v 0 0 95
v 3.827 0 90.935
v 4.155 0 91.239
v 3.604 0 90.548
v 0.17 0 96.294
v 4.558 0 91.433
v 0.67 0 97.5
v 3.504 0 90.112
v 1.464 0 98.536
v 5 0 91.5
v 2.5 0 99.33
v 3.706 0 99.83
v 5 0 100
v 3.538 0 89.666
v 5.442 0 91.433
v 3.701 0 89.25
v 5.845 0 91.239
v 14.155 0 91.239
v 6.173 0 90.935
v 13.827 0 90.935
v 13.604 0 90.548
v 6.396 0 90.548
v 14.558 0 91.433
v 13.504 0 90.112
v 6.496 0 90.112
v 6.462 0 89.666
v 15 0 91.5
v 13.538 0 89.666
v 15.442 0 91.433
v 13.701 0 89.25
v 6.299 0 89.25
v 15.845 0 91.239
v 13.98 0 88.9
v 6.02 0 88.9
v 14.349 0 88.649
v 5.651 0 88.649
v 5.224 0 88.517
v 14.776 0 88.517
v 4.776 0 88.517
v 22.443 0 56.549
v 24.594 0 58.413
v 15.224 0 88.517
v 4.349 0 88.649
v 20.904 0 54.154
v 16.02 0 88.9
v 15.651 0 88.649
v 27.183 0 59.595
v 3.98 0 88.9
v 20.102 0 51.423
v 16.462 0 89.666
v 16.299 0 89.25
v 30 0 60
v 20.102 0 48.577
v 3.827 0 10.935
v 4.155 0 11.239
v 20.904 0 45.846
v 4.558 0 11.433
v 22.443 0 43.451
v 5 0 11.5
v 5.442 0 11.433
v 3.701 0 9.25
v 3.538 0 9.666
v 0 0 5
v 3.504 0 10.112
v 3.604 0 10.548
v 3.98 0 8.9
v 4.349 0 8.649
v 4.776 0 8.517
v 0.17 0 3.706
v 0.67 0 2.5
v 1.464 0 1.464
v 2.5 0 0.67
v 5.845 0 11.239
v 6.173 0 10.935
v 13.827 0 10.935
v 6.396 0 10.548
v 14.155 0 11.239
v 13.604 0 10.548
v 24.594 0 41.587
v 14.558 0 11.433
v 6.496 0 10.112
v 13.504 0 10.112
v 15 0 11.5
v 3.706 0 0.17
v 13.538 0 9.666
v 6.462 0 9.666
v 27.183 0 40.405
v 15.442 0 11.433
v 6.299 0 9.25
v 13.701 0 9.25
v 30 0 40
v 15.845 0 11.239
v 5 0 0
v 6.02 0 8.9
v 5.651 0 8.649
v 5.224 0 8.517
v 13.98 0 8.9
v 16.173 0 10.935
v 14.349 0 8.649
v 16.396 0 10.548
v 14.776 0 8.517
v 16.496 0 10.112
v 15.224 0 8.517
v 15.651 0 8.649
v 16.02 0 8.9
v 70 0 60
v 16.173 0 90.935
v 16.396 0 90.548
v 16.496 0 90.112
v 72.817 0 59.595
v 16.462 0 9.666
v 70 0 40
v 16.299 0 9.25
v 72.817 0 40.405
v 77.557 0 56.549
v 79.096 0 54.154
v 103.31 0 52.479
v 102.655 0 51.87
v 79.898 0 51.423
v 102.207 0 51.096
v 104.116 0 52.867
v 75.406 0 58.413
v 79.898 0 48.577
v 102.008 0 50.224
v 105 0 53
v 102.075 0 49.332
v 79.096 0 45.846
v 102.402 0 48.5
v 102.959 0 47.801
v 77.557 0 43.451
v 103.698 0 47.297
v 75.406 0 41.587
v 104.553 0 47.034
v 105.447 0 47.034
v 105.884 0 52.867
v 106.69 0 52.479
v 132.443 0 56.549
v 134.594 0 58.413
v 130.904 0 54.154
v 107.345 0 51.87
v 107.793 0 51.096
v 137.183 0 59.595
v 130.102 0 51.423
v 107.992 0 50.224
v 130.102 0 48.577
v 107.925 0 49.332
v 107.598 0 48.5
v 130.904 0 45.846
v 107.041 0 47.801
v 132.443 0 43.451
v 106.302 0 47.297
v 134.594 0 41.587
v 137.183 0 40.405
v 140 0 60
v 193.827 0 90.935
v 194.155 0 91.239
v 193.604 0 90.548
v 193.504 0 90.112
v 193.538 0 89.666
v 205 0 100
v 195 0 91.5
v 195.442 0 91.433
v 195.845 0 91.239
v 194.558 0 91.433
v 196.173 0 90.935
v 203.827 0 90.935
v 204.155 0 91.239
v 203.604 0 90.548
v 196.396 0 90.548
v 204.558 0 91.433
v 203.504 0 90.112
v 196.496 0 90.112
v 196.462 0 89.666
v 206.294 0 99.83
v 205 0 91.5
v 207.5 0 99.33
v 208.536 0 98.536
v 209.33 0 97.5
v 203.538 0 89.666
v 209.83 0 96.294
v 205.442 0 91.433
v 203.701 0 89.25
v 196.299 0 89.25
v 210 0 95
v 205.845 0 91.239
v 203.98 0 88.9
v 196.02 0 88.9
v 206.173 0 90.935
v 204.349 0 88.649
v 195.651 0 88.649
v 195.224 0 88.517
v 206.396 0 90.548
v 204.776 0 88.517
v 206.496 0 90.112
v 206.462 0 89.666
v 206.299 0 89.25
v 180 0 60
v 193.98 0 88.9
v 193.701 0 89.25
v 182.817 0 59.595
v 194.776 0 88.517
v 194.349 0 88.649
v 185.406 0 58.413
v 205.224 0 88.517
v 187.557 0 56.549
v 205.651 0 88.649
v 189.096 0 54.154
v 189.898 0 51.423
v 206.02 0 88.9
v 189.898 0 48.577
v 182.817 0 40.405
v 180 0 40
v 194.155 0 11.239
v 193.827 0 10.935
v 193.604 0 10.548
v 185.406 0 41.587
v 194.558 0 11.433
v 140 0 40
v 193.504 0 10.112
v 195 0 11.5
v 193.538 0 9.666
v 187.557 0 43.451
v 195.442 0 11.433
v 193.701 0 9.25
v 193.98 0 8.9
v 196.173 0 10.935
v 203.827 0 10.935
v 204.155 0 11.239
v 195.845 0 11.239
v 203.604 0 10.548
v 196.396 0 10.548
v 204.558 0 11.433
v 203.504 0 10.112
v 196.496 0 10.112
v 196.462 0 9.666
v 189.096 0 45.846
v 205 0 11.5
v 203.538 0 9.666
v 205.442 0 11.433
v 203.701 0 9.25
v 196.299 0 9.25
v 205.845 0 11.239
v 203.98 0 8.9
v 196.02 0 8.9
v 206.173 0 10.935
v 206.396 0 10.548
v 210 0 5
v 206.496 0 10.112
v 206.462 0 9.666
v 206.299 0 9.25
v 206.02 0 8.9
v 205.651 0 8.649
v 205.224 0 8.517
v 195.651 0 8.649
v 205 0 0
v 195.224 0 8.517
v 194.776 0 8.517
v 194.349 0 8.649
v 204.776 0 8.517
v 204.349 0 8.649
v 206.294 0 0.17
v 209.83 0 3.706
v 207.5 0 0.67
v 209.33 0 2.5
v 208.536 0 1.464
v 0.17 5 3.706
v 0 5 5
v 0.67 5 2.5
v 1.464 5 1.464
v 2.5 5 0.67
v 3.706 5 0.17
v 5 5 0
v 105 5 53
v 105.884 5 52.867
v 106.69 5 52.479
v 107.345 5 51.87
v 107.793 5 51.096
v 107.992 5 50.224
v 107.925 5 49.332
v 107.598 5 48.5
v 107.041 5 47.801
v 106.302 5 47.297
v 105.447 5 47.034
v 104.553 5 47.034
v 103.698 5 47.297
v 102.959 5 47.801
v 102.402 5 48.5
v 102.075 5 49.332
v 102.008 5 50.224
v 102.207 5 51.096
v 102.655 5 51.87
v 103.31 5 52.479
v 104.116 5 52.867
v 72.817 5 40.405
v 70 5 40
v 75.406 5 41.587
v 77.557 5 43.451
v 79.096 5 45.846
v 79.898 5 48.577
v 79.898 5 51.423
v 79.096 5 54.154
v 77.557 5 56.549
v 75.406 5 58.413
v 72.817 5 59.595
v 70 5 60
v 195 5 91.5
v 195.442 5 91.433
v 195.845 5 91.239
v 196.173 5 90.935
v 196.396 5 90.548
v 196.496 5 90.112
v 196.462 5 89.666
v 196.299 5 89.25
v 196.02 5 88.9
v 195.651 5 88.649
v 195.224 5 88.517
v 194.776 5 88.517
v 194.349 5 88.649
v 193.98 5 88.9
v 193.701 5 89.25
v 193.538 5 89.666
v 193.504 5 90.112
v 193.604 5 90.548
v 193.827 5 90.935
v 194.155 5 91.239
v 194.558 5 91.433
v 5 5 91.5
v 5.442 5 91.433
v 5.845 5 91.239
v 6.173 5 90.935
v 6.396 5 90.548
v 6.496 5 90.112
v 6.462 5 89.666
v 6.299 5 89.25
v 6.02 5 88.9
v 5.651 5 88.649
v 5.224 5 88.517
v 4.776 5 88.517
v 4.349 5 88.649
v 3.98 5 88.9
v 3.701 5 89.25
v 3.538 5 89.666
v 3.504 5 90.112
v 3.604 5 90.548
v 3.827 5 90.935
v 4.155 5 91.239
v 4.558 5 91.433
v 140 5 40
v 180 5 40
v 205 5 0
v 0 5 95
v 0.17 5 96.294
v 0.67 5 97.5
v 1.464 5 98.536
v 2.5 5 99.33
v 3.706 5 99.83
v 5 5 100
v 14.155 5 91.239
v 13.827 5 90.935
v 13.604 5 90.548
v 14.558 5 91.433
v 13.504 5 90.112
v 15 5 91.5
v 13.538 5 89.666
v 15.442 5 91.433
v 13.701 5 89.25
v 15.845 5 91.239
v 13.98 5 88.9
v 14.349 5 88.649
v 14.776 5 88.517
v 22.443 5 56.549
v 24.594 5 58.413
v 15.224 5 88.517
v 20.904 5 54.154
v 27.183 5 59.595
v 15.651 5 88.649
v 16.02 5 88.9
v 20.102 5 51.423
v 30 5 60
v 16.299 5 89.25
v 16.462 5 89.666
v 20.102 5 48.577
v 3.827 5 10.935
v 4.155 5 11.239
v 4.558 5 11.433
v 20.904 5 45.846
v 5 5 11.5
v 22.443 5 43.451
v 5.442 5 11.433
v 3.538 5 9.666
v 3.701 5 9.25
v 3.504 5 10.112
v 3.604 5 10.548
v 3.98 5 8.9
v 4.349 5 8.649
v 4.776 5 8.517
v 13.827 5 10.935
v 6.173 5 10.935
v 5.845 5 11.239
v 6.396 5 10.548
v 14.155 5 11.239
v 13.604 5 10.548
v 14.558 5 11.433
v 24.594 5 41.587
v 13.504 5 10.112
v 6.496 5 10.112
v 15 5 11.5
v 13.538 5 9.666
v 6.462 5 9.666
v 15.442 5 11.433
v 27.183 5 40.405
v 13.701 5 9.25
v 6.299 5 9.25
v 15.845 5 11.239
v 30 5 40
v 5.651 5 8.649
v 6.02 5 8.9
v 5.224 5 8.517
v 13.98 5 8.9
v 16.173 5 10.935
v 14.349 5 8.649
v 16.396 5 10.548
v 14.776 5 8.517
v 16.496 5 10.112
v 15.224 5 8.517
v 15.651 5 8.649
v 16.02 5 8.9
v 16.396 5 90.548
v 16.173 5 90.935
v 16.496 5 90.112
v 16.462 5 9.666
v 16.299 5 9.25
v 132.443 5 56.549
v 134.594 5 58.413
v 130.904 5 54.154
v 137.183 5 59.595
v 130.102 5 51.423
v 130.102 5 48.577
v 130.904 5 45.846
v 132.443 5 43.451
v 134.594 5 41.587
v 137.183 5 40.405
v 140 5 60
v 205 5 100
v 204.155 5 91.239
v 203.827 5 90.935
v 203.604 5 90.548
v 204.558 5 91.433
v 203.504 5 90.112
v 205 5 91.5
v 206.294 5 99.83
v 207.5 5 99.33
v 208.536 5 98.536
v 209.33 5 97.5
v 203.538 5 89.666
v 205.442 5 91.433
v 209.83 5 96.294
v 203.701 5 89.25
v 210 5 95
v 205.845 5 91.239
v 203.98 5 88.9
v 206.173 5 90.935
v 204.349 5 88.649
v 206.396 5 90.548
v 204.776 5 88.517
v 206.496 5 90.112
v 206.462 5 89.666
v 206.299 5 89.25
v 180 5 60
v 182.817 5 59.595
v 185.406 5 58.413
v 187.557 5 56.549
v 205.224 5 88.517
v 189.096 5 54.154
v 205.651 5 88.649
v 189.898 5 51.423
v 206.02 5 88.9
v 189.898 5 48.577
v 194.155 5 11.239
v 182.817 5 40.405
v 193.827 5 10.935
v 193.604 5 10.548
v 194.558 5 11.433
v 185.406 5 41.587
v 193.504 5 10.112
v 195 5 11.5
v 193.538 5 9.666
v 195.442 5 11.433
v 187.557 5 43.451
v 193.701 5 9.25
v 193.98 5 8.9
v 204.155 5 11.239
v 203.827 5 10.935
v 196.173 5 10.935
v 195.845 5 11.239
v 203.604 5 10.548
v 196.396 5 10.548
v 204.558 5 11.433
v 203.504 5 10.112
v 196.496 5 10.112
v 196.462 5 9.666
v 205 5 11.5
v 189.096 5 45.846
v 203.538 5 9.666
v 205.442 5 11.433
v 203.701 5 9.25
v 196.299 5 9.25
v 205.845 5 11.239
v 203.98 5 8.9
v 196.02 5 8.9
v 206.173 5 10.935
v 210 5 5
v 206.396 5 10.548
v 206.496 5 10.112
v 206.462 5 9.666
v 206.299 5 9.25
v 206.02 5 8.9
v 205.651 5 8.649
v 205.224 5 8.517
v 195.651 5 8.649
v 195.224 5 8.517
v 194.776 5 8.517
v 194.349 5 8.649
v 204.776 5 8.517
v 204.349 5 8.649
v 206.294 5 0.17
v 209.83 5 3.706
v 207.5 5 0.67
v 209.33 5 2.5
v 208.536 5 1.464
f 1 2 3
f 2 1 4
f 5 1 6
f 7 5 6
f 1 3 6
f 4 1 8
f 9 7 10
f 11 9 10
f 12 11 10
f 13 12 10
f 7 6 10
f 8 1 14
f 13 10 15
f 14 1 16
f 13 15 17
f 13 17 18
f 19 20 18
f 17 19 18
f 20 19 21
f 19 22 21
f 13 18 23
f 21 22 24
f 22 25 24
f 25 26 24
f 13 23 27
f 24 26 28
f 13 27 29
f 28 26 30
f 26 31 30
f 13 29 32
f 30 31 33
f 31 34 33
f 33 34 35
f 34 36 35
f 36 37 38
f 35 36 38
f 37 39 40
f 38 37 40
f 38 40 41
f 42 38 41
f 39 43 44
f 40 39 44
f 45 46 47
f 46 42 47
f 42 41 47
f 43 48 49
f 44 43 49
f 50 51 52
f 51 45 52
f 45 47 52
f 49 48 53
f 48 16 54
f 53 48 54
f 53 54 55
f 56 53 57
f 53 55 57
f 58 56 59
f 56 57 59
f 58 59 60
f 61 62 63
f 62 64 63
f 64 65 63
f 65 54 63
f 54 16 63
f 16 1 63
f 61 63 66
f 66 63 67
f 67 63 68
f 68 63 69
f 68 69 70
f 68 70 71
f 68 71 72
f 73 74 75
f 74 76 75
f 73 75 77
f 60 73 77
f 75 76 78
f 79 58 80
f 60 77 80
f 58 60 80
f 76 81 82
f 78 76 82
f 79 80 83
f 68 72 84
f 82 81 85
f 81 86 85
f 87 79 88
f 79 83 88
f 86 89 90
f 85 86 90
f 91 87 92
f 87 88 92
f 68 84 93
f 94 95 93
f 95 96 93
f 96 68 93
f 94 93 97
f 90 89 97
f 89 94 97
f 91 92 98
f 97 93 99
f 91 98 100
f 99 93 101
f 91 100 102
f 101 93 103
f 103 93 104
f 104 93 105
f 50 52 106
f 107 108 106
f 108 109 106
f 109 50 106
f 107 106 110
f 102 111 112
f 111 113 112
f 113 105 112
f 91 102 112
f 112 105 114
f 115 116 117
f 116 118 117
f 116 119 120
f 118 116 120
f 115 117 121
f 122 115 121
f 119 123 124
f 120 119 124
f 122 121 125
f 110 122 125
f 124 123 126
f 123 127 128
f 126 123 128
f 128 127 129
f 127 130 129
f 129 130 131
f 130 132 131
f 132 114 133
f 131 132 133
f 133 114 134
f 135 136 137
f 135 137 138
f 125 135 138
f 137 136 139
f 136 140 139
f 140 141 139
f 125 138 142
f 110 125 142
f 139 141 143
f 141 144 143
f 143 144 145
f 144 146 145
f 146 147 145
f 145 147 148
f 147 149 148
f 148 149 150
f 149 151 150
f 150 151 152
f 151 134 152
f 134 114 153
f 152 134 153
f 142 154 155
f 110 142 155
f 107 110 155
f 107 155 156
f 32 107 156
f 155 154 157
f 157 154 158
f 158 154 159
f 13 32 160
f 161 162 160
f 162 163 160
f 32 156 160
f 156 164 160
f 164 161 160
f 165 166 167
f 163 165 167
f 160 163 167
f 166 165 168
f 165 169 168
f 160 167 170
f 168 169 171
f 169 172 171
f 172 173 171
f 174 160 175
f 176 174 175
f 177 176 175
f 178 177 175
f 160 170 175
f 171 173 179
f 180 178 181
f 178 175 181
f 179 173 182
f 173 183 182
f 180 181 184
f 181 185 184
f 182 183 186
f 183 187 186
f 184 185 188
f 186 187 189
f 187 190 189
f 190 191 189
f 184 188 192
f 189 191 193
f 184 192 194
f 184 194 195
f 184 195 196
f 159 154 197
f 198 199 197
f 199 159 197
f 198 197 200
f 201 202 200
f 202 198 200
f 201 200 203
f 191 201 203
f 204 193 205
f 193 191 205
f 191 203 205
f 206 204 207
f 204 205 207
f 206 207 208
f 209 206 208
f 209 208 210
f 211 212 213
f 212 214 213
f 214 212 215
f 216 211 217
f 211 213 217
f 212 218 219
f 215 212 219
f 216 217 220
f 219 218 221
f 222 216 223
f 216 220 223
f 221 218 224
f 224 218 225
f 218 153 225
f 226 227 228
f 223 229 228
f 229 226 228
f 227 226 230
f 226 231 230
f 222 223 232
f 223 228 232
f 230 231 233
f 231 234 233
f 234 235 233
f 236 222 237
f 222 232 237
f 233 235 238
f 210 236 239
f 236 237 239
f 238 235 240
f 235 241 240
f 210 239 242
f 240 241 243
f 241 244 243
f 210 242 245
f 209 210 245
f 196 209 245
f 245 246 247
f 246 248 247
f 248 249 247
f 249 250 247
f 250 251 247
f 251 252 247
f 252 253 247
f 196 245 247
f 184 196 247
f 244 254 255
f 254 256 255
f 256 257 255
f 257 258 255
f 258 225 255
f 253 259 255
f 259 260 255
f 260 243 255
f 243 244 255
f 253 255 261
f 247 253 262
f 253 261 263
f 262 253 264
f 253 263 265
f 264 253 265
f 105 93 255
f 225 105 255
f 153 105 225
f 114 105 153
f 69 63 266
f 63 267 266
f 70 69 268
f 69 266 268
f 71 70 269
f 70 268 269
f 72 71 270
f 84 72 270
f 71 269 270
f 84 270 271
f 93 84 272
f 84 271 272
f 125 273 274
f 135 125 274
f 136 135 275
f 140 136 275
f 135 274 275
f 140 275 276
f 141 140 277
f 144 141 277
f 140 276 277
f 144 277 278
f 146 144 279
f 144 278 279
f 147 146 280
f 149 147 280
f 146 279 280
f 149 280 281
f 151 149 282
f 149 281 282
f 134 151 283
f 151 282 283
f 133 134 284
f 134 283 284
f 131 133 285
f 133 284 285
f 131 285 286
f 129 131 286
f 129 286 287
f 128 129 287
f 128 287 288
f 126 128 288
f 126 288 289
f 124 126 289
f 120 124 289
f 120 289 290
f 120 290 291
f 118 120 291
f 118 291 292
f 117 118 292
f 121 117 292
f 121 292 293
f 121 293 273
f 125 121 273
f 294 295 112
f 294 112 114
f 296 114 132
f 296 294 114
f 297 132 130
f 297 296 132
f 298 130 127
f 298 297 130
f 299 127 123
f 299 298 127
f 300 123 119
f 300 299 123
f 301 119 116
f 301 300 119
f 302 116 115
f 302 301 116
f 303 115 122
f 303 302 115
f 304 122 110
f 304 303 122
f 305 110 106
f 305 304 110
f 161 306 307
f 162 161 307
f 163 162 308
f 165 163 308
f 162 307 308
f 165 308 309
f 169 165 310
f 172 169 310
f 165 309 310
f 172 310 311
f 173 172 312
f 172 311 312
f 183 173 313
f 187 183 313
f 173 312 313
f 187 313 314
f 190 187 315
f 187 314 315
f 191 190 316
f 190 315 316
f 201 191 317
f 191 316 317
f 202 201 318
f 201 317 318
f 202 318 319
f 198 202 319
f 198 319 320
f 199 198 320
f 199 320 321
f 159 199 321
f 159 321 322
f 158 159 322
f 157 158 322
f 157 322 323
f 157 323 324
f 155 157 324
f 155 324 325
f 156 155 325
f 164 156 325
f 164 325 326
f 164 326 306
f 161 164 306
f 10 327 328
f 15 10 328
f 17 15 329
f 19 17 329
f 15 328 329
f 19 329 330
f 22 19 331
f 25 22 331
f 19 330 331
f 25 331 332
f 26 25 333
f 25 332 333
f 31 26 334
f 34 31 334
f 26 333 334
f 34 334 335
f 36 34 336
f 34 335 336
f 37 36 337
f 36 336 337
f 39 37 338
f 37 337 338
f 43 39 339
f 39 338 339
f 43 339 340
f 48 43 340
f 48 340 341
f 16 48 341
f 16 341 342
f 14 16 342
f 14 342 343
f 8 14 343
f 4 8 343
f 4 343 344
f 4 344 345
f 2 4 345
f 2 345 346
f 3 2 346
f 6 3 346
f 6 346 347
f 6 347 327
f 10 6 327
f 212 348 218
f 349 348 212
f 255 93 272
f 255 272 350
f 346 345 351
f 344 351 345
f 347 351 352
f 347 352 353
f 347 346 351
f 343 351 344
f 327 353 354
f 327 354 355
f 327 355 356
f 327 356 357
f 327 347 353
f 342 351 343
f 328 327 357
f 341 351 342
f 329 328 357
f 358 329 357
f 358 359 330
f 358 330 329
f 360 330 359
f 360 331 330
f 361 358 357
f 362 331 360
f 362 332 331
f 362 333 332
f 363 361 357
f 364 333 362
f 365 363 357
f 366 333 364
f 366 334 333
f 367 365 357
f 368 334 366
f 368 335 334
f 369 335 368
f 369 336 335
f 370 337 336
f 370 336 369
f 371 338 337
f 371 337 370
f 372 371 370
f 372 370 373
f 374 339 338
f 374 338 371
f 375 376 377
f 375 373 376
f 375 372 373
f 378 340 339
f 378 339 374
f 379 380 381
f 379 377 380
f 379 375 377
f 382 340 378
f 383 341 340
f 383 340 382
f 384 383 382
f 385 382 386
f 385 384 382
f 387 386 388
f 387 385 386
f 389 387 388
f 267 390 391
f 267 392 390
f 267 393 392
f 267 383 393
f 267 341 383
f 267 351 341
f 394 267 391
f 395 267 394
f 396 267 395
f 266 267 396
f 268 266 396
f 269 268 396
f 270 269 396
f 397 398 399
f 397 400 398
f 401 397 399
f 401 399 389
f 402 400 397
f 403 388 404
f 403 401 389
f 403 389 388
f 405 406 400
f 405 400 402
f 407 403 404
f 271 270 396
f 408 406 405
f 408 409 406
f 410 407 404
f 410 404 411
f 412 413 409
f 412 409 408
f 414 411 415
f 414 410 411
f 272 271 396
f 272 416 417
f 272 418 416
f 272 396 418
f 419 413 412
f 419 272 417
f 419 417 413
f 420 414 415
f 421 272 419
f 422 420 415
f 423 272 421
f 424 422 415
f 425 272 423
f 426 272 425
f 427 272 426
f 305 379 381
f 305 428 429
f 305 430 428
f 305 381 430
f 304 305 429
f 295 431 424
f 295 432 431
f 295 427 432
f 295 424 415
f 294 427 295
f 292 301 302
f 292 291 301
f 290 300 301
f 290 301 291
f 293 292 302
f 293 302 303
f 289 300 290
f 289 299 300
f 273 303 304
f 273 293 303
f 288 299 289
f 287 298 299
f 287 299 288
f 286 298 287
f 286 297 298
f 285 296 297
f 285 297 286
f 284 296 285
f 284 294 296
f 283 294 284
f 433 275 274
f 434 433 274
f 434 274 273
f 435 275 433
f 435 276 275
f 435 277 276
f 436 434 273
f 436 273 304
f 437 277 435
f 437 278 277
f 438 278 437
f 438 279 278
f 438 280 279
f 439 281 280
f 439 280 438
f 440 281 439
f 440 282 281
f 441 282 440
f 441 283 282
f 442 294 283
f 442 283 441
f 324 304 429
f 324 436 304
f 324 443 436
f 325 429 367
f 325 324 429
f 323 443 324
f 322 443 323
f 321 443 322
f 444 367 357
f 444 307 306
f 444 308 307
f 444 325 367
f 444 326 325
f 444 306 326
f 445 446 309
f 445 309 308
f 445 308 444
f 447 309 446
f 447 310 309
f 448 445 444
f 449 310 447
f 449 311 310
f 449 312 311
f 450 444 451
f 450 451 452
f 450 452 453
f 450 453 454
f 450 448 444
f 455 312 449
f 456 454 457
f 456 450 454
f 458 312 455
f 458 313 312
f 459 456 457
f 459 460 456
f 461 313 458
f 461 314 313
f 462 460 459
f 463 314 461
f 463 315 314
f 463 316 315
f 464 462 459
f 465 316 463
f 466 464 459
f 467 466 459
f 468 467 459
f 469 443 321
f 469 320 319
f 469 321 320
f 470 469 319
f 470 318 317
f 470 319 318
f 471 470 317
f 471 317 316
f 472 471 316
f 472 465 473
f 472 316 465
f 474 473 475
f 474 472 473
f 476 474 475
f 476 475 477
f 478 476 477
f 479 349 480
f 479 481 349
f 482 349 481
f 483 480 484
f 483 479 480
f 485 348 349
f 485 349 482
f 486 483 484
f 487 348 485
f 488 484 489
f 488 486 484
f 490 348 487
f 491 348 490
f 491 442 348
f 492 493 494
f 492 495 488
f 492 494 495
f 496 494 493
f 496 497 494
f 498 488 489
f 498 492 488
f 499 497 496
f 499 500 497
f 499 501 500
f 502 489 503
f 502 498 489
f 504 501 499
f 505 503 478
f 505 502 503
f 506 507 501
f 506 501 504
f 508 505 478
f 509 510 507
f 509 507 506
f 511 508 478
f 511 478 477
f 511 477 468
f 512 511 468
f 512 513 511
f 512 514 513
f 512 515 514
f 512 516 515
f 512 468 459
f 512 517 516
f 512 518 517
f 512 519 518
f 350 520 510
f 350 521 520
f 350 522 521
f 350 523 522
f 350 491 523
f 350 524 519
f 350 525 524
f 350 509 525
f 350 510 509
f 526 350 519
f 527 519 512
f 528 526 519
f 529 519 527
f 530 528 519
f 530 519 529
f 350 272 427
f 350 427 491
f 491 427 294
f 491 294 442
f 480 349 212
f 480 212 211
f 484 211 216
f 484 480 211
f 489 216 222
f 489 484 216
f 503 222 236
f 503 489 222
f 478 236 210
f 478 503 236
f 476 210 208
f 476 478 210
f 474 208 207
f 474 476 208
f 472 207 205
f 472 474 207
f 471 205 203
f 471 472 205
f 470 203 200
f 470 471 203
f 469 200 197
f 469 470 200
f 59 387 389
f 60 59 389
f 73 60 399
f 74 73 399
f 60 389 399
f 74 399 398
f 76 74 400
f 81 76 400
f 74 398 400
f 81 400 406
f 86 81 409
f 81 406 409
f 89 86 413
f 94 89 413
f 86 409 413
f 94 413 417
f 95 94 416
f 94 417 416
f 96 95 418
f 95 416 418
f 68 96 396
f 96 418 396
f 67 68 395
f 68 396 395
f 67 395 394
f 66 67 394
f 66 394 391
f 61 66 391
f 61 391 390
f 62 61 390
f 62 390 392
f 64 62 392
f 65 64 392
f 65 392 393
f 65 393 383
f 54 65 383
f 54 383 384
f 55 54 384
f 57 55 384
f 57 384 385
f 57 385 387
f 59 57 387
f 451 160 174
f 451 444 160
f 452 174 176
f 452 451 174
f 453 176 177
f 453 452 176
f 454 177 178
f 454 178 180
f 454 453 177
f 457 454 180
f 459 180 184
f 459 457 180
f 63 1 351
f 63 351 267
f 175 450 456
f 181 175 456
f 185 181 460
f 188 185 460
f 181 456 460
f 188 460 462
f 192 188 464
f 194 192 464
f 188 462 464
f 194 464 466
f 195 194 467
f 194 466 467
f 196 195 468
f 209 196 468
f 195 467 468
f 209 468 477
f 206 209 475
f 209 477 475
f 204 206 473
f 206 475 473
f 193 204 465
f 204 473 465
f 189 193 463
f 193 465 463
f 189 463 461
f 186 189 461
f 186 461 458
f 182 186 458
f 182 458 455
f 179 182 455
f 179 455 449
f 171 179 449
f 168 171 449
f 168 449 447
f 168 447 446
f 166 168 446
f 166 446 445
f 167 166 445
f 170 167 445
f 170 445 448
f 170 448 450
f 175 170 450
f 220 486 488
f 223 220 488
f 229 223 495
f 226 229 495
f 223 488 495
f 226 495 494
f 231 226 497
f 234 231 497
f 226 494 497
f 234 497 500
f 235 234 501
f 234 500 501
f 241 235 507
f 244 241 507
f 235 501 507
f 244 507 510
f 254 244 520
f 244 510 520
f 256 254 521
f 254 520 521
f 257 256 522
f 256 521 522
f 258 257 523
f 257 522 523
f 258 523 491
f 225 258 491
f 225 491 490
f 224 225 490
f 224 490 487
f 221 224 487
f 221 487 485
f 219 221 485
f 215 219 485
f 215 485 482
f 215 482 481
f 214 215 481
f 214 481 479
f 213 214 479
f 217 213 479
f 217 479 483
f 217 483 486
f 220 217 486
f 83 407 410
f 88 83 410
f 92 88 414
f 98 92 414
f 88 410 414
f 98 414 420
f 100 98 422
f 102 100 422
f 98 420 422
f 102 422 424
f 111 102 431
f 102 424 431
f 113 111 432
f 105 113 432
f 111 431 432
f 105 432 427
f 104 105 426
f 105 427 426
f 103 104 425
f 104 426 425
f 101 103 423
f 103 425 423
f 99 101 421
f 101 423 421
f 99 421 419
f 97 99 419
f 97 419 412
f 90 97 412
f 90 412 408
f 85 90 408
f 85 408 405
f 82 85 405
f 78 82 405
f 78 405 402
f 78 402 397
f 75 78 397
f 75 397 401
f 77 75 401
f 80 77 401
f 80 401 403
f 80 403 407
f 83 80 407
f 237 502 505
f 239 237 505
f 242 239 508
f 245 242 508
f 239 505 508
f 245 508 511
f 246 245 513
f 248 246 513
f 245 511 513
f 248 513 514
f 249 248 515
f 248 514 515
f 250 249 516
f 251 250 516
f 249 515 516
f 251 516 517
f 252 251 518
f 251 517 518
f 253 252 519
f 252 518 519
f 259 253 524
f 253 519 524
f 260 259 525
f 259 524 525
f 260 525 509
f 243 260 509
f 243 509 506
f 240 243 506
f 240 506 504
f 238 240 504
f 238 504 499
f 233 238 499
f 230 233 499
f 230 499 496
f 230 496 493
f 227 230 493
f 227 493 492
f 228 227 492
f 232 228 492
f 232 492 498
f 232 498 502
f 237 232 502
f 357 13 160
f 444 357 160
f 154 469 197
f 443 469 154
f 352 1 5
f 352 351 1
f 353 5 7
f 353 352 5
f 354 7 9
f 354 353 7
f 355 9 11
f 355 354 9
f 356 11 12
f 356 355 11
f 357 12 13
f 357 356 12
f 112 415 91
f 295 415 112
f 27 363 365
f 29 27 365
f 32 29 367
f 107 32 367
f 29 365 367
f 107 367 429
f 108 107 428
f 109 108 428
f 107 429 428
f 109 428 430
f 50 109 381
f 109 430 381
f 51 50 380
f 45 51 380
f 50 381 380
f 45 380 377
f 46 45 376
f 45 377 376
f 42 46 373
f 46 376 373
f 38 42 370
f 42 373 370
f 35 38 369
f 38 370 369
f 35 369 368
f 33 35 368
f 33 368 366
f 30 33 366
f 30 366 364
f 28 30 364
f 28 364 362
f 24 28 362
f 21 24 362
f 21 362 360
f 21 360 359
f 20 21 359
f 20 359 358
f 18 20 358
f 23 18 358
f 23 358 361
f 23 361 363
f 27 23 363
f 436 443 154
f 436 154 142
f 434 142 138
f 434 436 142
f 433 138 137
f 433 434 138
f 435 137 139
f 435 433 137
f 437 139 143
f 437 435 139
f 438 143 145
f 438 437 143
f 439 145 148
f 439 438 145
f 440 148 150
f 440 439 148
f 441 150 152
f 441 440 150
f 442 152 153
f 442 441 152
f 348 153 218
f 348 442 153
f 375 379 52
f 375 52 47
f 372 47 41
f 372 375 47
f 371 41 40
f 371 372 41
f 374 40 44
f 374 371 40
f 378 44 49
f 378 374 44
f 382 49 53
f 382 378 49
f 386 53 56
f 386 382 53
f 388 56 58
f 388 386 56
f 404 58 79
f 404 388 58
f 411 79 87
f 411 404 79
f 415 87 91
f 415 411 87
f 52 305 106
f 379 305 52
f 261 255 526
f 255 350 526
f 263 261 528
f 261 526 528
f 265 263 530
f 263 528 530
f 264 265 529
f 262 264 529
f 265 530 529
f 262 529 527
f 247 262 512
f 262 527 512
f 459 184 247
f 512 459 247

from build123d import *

# Parameters (mm, degrees)
SKETCH_1_W          = 210
SKETCH_1_H          = 100
EXTRUDE_1_DEPTH     = 5
CUT_EXTRUDE_1_DEPTH = 40
SKETCH_4_R          = 3
CUT_EXTRUDE_3_DEPTH = 20
SKETCH_8_R          = 1.5
CUT_EXTRUDE_4_DEPTH = 20
FILLET_1_R          = 5


with BuildPart() as part:
    # 草图1 → 凸台-拉伸1 (new body)
    with BuildSketch(Plane(origin=(0, 0, 0), x_dir=(1, 0, 0), z_dir=(0, 1, 0))):
        with Locations((105, -50)):
            Rectangle(SKETCH_1_W, SKETCH_1_H)
    extrude(amount=EXTRUDE_1_DEPTH)

    # 草图2 → 切除-拉伸1 (cut)
    with BuildSketch(Plane(origin=(0, 5, 0), x_dir=(1, 0, 0), z_dir=(0, 1, 0))):
        with BuildLine():
            Line((30, -40), (70, -40))
            ThreePointArc((70, -40), (80, -50), (70, -60))
            Line((70, -60), (30, -60))
            ThreePointArc((30, -60), (20, -50), (30, -40))
        make_face()
        with BuildLine():
            Line((140, -40), (180, -40))
            ThreePointArc((180, -40), (190, -50), (180, -60))
            Line((180, -60), (140, -60))
            ThreePointArc((140, -60), (130, -50), (140, -40))
        make_face()
    extrude(amount=-CUT_EXTRUDE_1_DEPTH, mode=Mode.SUBTRACT)

    # 草图4 → 切除-拉伸3 (cut)
    with BuildSketch(Plane(origin=(0, 5, 0), x_dir=(1, 0, 0), z_dir=(0, 1, 0))):
        with Locations(Location((105, -50, 0), (0, 0, 270))):
            Circle(SKETCH_4_R)
    extrude(amount=-CUT_EXTRUDE_3_DEPTH, mode=Mode.SUBTRACT)

    # 草图8 → 切除-拉伸4 (cut)
    with BuildSketch(Plane(origin=(0, 5, 0), x_dir=(1, 0, 0), z_dir=(0, 1, 0))):
        with Locations(Location((5, -10, 0), (0, 0, 270))):
            Circle(SKETCH_8_R)
        with Locations(Location((205, -10, 0), (0, 0, 270))):
            Circle(SKETCH_8_R)
        with Locations(Location((205, -90, 0), (0, 0, 270))):
            Circle(SKETCH_8_R)
        with Locations(Location((5, -90, 0), (0, 0, 270))):
            Circle(SKETCH_8_R)
        with Locations(Location((15, -10, 0), (0, 0, 270))):
            Circle(SKETCH_8_R)
        with Locations(Location((15, -90, 0), (0, 0, 270))):
            Circle(SKETCH_8_R)
        with Locations(Location((195, -90, 0), (0, 0, 270))):
            Circle(SKETCH_8_R)
        with Locations(Location((195, -10, 0), (0, 0, 270))):
            Circle(SKETCH_8_R)
    extrude(amount=-CUT_EXTRUDE_4_DEPTH, mode=Mode.SUBTRACT)

    # 圆角1
    fillet_1_edges = [part.edges().sort_by_distance(p)[0] for p in [
        (0, 2.5, 0),
        (210, 2.5, 0),
        (210, 2.5, 100),
        (0, 2.5, 100),
    ]]
    fillet(fillet_1_edges, radius=FILLET_1_R)


solid = part.part
